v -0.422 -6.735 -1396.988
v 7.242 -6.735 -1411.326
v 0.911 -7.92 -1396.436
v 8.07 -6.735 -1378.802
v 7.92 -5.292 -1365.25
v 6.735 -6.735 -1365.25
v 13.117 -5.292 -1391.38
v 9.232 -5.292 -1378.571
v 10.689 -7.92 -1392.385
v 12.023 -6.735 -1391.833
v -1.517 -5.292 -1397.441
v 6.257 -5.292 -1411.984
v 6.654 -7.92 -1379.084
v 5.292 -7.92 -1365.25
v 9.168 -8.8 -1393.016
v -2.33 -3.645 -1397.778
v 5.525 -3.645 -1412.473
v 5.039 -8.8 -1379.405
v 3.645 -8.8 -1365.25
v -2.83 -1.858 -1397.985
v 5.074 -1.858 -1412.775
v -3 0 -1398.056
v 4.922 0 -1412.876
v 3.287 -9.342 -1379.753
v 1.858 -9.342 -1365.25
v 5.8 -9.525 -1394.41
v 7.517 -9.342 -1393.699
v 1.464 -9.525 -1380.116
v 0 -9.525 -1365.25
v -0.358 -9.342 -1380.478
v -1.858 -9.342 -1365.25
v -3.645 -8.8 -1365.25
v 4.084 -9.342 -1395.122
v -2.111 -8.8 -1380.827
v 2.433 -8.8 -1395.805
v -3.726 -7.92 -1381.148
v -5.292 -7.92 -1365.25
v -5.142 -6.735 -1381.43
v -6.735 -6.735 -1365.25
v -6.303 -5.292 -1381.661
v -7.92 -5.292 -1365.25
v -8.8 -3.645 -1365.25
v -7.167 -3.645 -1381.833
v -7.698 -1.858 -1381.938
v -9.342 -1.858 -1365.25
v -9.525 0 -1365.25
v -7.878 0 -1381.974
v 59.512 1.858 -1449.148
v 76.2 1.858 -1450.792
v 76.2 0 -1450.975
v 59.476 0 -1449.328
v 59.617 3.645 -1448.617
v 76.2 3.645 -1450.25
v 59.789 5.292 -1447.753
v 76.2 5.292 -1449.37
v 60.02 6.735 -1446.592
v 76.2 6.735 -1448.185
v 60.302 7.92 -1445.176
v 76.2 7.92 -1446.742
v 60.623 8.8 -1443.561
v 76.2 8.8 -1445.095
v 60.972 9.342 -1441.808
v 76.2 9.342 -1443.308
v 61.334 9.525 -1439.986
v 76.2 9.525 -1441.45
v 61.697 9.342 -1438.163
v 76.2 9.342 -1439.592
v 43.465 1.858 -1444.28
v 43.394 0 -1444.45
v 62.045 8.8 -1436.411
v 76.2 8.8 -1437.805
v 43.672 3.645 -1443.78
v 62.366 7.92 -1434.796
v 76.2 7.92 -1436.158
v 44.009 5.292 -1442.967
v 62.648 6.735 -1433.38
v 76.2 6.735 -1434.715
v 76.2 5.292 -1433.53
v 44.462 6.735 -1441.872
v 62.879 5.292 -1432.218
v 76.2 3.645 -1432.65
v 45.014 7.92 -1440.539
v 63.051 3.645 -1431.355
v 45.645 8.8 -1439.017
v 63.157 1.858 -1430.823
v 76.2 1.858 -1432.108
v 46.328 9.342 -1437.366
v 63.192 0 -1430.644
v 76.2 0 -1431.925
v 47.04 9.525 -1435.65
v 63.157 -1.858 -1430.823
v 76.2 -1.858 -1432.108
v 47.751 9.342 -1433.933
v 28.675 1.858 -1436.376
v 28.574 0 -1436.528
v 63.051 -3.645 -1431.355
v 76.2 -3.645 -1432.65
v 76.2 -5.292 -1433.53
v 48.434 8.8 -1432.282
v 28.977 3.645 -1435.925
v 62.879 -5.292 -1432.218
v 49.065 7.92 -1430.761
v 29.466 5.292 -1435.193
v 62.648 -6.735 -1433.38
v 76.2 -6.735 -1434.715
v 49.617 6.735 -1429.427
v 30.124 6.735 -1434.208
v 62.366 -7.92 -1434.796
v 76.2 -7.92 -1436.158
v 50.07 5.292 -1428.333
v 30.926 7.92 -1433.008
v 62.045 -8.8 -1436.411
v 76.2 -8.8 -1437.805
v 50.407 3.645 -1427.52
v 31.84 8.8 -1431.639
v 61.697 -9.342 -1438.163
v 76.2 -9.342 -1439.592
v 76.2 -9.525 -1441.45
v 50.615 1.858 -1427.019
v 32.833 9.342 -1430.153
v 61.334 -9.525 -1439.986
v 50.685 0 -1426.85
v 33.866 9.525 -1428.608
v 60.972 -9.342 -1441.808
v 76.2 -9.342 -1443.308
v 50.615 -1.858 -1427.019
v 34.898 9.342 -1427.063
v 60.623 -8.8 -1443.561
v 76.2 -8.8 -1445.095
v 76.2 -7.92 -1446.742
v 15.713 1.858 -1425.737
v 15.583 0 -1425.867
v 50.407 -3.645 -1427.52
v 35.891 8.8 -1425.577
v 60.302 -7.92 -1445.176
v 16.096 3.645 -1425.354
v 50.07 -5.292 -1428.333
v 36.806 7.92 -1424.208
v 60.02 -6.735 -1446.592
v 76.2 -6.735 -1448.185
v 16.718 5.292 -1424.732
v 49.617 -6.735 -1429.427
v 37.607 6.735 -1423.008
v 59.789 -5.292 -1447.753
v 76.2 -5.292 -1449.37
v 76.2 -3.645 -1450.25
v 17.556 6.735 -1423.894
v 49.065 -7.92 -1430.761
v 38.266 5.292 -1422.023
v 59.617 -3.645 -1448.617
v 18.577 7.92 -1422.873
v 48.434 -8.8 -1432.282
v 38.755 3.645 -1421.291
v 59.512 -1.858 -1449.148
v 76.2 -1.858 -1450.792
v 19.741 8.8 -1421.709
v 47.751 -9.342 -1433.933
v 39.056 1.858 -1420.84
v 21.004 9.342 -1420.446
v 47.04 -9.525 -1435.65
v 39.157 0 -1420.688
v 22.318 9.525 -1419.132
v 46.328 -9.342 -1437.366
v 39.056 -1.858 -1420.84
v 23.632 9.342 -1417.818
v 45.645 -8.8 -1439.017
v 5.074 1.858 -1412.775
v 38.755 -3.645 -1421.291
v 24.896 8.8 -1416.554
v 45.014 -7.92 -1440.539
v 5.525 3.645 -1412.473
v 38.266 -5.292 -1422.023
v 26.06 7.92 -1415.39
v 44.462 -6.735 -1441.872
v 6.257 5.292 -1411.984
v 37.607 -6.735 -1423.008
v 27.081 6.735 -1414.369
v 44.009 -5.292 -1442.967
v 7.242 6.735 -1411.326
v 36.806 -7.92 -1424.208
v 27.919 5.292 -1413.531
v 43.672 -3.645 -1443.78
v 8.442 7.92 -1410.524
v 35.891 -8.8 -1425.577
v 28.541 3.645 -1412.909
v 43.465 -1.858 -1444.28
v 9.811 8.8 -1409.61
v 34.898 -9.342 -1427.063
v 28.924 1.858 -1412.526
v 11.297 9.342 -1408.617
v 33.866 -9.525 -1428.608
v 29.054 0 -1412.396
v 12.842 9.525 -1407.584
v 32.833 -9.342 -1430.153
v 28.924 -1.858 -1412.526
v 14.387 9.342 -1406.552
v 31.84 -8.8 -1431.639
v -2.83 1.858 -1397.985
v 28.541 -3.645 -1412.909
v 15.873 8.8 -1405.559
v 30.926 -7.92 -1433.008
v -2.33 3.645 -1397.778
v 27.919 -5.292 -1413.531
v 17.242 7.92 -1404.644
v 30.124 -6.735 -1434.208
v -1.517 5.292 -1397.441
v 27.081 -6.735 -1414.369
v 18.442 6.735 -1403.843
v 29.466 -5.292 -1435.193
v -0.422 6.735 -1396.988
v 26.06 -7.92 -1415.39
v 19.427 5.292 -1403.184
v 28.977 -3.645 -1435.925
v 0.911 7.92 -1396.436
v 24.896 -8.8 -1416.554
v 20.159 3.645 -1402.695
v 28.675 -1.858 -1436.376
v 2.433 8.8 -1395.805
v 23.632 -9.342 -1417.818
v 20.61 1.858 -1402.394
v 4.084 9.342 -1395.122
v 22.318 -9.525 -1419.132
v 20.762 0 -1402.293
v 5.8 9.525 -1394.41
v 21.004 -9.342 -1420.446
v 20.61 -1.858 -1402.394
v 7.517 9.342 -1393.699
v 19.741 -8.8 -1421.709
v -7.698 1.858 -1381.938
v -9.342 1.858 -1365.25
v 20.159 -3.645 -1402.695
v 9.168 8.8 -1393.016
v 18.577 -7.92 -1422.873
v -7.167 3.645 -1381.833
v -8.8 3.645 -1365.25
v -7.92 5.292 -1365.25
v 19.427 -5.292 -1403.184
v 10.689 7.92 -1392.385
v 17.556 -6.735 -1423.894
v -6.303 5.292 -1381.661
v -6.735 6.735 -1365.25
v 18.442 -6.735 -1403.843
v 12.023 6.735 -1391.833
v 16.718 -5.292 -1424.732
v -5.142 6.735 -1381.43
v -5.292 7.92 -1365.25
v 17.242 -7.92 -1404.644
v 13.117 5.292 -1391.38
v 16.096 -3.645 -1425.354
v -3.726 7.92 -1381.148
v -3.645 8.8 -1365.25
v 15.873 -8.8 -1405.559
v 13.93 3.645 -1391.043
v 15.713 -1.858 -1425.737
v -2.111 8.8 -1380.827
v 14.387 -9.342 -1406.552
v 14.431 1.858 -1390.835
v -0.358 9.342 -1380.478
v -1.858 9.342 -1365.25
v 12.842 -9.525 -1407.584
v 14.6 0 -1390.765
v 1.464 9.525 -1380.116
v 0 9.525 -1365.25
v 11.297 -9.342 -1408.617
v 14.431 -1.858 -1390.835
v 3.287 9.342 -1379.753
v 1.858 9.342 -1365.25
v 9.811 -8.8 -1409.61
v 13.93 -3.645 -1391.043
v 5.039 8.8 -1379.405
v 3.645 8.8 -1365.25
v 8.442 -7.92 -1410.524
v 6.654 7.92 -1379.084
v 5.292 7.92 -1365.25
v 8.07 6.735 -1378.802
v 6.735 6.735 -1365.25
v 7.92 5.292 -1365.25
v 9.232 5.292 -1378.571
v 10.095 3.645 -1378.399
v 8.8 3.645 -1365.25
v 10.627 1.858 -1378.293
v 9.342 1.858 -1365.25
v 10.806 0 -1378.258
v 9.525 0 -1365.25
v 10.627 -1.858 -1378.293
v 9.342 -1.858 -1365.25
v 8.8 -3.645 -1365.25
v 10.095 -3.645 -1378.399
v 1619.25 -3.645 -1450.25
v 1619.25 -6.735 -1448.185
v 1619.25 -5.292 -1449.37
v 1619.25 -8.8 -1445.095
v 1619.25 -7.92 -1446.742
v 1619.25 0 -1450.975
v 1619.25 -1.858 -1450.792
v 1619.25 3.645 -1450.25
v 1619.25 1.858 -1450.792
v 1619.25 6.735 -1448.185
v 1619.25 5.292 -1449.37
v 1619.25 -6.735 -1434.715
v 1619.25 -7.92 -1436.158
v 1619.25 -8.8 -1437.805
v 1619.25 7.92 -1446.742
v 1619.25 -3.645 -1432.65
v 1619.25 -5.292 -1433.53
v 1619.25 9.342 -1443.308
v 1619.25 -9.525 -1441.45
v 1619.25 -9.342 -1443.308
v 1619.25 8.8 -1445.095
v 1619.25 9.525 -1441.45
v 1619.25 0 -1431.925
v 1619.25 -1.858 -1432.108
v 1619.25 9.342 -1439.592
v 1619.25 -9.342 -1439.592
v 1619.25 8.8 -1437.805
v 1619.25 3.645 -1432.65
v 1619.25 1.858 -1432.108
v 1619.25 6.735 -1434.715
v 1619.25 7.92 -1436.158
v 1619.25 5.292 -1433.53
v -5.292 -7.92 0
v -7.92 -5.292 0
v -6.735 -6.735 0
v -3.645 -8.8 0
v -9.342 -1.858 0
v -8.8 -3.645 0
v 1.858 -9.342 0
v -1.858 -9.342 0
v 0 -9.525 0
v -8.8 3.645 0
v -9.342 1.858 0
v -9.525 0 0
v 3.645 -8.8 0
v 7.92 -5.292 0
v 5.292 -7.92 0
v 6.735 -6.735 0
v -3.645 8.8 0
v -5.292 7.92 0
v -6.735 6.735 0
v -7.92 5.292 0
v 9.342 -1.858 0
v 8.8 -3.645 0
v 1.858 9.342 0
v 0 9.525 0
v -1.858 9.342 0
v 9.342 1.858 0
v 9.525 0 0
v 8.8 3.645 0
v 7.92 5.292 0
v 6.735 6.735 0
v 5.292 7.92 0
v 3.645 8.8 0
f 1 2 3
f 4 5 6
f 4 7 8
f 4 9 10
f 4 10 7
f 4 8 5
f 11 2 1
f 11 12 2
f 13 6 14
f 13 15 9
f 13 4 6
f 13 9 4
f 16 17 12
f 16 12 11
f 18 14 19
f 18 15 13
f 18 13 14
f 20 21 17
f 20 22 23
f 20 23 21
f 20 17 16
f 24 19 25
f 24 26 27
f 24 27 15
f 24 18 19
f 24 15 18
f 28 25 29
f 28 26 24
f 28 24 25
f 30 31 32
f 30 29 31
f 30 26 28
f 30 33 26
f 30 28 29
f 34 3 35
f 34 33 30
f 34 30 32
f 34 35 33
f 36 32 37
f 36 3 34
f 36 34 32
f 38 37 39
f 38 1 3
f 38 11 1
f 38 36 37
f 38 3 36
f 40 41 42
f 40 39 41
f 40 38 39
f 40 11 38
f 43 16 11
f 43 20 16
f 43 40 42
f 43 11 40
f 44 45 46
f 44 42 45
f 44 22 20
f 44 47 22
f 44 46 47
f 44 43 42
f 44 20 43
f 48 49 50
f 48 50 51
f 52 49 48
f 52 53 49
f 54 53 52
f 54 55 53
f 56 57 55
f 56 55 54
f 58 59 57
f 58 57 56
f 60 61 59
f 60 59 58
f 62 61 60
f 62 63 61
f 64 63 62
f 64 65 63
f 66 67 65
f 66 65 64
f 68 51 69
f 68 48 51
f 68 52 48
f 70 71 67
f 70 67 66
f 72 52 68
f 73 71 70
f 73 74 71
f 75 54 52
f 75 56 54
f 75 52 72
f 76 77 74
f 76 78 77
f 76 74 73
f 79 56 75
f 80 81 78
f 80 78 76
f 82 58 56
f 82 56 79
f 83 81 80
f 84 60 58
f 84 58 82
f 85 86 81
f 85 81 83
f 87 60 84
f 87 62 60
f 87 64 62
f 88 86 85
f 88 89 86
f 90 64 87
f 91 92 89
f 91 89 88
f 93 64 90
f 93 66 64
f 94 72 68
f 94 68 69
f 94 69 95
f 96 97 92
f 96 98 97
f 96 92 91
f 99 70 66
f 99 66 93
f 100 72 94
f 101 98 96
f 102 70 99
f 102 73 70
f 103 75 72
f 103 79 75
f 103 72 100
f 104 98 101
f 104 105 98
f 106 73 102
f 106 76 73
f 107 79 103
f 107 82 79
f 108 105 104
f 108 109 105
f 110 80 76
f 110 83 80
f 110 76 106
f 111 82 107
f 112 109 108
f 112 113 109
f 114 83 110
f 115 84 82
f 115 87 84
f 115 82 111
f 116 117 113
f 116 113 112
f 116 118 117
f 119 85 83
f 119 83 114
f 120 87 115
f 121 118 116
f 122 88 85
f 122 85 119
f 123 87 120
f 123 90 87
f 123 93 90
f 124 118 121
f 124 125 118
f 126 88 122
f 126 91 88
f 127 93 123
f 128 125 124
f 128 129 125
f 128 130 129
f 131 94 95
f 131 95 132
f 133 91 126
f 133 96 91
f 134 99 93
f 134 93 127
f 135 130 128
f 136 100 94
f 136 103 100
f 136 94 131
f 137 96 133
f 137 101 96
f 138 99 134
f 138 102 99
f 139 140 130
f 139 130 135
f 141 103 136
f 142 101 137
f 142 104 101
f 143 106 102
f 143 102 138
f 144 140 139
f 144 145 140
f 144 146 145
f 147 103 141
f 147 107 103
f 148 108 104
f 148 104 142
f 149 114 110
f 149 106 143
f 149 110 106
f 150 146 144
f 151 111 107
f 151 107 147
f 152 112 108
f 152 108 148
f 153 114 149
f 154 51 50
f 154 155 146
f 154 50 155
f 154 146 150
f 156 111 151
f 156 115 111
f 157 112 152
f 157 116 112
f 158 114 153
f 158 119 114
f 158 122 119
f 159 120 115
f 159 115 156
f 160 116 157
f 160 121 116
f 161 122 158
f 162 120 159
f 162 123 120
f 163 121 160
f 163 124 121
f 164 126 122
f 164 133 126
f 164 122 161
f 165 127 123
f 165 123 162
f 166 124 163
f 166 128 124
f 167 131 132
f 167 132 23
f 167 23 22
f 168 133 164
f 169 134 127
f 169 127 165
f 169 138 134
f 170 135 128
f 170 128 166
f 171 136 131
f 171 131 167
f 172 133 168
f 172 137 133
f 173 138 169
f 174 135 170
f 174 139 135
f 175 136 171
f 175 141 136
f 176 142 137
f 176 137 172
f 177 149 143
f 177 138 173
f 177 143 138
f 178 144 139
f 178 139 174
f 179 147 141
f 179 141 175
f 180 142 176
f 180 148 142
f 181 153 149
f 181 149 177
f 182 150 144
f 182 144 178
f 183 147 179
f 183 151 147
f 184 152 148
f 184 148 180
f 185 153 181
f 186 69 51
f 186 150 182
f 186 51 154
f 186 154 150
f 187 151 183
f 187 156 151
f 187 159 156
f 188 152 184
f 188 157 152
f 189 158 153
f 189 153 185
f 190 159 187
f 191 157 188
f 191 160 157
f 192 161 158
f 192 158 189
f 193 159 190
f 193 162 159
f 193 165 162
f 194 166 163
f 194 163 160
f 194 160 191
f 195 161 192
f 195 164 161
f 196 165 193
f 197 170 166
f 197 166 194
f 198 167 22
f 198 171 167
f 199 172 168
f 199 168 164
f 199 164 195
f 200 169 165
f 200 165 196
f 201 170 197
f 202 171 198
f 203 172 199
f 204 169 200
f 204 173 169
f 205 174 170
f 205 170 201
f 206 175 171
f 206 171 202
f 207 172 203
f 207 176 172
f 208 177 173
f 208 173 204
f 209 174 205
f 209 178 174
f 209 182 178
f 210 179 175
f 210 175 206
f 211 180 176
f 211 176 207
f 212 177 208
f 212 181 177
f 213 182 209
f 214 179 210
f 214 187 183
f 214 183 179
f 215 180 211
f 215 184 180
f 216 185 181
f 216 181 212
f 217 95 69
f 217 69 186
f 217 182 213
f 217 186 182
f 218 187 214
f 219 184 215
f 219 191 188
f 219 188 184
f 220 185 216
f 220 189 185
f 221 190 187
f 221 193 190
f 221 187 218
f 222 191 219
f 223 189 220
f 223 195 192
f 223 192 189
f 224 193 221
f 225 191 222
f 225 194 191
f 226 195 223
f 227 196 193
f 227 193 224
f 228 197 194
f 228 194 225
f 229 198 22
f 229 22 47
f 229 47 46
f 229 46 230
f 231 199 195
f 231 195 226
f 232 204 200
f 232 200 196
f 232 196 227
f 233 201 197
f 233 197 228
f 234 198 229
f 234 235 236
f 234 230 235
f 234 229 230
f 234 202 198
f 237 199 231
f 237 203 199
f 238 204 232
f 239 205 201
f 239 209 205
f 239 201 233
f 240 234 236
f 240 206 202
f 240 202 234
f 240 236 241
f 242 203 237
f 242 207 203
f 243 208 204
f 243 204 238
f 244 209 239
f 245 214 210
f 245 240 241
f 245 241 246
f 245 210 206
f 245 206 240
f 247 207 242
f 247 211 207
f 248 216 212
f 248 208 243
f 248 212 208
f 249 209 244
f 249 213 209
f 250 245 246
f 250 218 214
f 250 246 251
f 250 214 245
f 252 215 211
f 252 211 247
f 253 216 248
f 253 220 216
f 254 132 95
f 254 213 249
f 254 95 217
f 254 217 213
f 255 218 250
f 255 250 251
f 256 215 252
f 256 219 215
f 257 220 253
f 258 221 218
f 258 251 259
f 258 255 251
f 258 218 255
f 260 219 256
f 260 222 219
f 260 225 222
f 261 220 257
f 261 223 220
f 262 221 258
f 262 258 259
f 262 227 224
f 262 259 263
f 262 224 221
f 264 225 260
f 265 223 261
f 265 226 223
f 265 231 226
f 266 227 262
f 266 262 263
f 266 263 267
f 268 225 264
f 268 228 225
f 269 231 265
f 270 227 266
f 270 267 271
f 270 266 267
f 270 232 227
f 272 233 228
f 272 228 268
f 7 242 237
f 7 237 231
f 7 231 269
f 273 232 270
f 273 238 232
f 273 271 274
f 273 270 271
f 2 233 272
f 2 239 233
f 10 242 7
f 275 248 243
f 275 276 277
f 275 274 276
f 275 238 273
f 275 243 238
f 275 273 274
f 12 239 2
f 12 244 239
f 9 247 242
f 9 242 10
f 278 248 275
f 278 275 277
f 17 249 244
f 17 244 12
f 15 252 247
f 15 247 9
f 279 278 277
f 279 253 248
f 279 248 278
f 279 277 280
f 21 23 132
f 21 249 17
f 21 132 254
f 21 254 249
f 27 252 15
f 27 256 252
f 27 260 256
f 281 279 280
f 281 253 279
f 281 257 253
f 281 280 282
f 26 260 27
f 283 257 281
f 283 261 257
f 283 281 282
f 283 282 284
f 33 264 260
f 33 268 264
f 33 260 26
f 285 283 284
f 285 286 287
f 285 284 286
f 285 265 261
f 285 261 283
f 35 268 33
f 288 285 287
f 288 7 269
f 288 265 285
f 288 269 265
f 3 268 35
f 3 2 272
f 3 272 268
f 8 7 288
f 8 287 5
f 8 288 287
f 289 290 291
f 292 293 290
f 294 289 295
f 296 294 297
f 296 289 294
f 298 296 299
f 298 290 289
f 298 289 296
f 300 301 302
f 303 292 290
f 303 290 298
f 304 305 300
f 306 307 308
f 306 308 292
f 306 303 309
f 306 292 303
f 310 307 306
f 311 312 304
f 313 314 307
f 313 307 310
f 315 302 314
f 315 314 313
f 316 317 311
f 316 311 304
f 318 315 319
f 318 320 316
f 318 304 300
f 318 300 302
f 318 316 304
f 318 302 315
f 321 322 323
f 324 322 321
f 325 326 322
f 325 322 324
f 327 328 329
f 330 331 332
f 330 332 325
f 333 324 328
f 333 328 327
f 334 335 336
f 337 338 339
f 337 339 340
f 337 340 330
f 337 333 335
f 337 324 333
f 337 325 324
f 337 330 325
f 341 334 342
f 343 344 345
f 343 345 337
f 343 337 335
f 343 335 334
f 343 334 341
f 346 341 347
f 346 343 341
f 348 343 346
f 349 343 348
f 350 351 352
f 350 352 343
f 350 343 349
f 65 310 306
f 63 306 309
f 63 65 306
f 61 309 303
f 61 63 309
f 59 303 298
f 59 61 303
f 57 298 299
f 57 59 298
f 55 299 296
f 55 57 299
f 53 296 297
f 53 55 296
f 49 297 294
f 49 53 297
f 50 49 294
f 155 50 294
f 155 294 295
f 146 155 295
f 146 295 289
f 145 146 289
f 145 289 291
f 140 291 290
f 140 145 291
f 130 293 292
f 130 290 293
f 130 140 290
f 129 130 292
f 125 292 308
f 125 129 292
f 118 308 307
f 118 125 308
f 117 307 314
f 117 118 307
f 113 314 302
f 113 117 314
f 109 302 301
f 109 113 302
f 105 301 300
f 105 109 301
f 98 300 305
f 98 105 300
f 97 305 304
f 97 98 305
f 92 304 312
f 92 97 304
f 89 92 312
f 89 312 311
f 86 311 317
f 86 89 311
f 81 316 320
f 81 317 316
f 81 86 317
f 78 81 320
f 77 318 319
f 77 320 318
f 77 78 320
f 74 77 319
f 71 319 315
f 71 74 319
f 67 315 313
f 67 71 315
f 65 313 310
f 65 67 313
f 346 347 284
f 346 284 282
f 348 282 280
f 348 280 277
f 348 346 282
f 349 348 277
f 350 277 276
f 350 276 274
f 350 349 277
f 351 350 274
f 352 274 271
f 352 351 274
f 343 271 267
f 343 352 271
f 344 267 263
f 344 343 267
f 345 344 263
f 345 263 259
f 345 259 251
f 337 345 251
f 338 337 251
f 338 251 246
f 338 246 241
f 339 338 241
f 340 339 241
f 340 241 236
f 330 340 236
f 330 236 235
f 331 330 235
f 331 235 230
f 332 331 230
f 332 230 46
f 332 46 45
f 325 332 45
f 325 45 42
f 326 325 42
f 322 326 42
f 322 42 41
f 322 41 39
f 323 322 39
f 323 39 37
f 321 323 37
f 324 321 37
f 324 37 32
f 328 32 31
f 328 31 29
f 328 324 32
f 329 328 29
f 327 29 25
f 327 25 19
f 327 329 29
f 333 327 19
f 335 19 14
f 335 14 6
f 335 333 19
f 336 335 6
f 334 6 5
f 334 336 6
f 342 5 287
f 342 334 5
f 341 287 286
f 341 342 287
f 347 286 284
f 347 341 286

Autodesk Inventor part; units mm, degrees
ref_plane "XZ Plane" through (0, 0, 0) normal (0, 1, 0) x (-1, 0, 0)
ref_plane "XY Plane" through (0, 0, 0) normal (0, 0, 1) x (1, 0, 0)
sketch "Sketch2" plane through (0, 0, 0) normal (0, 0, 1) x (1, 0, 0)
  circle A0 centre (0, 0) radius 9.525
  dimension "d3" = 19.05
extrude "Extrusion2" add sketch "Sketch2" against normal blind 1365.25
ref_plane "Work Plane1" through (76.2, 0, 0) normal (1, 0, 0) x (0, 1, 0)
sketch "Sketch9" plane through (76.2, 0, 0) normal (1, 0, 0) x (0, 1, 0)
  line L0 (-9.525, -1365.25) -> (9.525, -1365.25) projected
  circle A0 centre (0, -1441.45) radius 9.525
  line L1 (0, -1365.25) -> (0, -1441.45) construction
  point P0 (0, 0)
  dimension "d17" = 19.05
  dimension "d18" = 76.2
extrude "Extrusion4" add sketch "Sketch9" along normal blind 1543.05
sketch "Sketch11" plane through (0, 0, -1365.25) normal (0, 0, -1) x (-1, 0, 0)
  circle A0 centre (0, 0) radius 9.525 projected
sketch "Sketch12" plane through (0, 0, 0) normal (0, 1, 0) x (-1, 0, 0)
  line L0 (-76.2, -1450.975) -> (-76.2, -1431.925) projected
  line L1 (-9.525, -1365.25) -> (9.525, -1365.25) projected
  arc A0 (-76.2, -1441.45) -> (0, -1365.25) centre (-76.2, -1365.25) ccw
  point P0 (0, 0)
  dimension "d21" = 76.2
sweep "Sweep2" add profiles "Sketch11" path "Sketch12" path curves A0
equation "\"d3\" = tubeD"
equation "\"d17\" = tubeD"
equation "\"d18\" = tubeTurnR"
equation "\"d21\" = tubeTurnR"
equation "\"d4\" = tubeTurnR"
equation "\"wallThick\" = 44.45"
equation "\"roomWidth\" = 3048"
equation "\"roomDepth\" = 3657.6"
equation "\"roomHeight\" = 2438.4"
equation "\"doorWidth\" = 895.35"
equation "\"doorHeight\" = 2108.2"
equation "\"doorX\" = 774.7"
equation "\"doorY\" = 88.9"
equation "\"doorLip\" = 76.2"
equation "\"doorThick\" = 57.15"
equation "\"tubeTurnR\" = 76.2"
equation "\"tubeD\" = 19.05"
properties part number "left_tube_0"
